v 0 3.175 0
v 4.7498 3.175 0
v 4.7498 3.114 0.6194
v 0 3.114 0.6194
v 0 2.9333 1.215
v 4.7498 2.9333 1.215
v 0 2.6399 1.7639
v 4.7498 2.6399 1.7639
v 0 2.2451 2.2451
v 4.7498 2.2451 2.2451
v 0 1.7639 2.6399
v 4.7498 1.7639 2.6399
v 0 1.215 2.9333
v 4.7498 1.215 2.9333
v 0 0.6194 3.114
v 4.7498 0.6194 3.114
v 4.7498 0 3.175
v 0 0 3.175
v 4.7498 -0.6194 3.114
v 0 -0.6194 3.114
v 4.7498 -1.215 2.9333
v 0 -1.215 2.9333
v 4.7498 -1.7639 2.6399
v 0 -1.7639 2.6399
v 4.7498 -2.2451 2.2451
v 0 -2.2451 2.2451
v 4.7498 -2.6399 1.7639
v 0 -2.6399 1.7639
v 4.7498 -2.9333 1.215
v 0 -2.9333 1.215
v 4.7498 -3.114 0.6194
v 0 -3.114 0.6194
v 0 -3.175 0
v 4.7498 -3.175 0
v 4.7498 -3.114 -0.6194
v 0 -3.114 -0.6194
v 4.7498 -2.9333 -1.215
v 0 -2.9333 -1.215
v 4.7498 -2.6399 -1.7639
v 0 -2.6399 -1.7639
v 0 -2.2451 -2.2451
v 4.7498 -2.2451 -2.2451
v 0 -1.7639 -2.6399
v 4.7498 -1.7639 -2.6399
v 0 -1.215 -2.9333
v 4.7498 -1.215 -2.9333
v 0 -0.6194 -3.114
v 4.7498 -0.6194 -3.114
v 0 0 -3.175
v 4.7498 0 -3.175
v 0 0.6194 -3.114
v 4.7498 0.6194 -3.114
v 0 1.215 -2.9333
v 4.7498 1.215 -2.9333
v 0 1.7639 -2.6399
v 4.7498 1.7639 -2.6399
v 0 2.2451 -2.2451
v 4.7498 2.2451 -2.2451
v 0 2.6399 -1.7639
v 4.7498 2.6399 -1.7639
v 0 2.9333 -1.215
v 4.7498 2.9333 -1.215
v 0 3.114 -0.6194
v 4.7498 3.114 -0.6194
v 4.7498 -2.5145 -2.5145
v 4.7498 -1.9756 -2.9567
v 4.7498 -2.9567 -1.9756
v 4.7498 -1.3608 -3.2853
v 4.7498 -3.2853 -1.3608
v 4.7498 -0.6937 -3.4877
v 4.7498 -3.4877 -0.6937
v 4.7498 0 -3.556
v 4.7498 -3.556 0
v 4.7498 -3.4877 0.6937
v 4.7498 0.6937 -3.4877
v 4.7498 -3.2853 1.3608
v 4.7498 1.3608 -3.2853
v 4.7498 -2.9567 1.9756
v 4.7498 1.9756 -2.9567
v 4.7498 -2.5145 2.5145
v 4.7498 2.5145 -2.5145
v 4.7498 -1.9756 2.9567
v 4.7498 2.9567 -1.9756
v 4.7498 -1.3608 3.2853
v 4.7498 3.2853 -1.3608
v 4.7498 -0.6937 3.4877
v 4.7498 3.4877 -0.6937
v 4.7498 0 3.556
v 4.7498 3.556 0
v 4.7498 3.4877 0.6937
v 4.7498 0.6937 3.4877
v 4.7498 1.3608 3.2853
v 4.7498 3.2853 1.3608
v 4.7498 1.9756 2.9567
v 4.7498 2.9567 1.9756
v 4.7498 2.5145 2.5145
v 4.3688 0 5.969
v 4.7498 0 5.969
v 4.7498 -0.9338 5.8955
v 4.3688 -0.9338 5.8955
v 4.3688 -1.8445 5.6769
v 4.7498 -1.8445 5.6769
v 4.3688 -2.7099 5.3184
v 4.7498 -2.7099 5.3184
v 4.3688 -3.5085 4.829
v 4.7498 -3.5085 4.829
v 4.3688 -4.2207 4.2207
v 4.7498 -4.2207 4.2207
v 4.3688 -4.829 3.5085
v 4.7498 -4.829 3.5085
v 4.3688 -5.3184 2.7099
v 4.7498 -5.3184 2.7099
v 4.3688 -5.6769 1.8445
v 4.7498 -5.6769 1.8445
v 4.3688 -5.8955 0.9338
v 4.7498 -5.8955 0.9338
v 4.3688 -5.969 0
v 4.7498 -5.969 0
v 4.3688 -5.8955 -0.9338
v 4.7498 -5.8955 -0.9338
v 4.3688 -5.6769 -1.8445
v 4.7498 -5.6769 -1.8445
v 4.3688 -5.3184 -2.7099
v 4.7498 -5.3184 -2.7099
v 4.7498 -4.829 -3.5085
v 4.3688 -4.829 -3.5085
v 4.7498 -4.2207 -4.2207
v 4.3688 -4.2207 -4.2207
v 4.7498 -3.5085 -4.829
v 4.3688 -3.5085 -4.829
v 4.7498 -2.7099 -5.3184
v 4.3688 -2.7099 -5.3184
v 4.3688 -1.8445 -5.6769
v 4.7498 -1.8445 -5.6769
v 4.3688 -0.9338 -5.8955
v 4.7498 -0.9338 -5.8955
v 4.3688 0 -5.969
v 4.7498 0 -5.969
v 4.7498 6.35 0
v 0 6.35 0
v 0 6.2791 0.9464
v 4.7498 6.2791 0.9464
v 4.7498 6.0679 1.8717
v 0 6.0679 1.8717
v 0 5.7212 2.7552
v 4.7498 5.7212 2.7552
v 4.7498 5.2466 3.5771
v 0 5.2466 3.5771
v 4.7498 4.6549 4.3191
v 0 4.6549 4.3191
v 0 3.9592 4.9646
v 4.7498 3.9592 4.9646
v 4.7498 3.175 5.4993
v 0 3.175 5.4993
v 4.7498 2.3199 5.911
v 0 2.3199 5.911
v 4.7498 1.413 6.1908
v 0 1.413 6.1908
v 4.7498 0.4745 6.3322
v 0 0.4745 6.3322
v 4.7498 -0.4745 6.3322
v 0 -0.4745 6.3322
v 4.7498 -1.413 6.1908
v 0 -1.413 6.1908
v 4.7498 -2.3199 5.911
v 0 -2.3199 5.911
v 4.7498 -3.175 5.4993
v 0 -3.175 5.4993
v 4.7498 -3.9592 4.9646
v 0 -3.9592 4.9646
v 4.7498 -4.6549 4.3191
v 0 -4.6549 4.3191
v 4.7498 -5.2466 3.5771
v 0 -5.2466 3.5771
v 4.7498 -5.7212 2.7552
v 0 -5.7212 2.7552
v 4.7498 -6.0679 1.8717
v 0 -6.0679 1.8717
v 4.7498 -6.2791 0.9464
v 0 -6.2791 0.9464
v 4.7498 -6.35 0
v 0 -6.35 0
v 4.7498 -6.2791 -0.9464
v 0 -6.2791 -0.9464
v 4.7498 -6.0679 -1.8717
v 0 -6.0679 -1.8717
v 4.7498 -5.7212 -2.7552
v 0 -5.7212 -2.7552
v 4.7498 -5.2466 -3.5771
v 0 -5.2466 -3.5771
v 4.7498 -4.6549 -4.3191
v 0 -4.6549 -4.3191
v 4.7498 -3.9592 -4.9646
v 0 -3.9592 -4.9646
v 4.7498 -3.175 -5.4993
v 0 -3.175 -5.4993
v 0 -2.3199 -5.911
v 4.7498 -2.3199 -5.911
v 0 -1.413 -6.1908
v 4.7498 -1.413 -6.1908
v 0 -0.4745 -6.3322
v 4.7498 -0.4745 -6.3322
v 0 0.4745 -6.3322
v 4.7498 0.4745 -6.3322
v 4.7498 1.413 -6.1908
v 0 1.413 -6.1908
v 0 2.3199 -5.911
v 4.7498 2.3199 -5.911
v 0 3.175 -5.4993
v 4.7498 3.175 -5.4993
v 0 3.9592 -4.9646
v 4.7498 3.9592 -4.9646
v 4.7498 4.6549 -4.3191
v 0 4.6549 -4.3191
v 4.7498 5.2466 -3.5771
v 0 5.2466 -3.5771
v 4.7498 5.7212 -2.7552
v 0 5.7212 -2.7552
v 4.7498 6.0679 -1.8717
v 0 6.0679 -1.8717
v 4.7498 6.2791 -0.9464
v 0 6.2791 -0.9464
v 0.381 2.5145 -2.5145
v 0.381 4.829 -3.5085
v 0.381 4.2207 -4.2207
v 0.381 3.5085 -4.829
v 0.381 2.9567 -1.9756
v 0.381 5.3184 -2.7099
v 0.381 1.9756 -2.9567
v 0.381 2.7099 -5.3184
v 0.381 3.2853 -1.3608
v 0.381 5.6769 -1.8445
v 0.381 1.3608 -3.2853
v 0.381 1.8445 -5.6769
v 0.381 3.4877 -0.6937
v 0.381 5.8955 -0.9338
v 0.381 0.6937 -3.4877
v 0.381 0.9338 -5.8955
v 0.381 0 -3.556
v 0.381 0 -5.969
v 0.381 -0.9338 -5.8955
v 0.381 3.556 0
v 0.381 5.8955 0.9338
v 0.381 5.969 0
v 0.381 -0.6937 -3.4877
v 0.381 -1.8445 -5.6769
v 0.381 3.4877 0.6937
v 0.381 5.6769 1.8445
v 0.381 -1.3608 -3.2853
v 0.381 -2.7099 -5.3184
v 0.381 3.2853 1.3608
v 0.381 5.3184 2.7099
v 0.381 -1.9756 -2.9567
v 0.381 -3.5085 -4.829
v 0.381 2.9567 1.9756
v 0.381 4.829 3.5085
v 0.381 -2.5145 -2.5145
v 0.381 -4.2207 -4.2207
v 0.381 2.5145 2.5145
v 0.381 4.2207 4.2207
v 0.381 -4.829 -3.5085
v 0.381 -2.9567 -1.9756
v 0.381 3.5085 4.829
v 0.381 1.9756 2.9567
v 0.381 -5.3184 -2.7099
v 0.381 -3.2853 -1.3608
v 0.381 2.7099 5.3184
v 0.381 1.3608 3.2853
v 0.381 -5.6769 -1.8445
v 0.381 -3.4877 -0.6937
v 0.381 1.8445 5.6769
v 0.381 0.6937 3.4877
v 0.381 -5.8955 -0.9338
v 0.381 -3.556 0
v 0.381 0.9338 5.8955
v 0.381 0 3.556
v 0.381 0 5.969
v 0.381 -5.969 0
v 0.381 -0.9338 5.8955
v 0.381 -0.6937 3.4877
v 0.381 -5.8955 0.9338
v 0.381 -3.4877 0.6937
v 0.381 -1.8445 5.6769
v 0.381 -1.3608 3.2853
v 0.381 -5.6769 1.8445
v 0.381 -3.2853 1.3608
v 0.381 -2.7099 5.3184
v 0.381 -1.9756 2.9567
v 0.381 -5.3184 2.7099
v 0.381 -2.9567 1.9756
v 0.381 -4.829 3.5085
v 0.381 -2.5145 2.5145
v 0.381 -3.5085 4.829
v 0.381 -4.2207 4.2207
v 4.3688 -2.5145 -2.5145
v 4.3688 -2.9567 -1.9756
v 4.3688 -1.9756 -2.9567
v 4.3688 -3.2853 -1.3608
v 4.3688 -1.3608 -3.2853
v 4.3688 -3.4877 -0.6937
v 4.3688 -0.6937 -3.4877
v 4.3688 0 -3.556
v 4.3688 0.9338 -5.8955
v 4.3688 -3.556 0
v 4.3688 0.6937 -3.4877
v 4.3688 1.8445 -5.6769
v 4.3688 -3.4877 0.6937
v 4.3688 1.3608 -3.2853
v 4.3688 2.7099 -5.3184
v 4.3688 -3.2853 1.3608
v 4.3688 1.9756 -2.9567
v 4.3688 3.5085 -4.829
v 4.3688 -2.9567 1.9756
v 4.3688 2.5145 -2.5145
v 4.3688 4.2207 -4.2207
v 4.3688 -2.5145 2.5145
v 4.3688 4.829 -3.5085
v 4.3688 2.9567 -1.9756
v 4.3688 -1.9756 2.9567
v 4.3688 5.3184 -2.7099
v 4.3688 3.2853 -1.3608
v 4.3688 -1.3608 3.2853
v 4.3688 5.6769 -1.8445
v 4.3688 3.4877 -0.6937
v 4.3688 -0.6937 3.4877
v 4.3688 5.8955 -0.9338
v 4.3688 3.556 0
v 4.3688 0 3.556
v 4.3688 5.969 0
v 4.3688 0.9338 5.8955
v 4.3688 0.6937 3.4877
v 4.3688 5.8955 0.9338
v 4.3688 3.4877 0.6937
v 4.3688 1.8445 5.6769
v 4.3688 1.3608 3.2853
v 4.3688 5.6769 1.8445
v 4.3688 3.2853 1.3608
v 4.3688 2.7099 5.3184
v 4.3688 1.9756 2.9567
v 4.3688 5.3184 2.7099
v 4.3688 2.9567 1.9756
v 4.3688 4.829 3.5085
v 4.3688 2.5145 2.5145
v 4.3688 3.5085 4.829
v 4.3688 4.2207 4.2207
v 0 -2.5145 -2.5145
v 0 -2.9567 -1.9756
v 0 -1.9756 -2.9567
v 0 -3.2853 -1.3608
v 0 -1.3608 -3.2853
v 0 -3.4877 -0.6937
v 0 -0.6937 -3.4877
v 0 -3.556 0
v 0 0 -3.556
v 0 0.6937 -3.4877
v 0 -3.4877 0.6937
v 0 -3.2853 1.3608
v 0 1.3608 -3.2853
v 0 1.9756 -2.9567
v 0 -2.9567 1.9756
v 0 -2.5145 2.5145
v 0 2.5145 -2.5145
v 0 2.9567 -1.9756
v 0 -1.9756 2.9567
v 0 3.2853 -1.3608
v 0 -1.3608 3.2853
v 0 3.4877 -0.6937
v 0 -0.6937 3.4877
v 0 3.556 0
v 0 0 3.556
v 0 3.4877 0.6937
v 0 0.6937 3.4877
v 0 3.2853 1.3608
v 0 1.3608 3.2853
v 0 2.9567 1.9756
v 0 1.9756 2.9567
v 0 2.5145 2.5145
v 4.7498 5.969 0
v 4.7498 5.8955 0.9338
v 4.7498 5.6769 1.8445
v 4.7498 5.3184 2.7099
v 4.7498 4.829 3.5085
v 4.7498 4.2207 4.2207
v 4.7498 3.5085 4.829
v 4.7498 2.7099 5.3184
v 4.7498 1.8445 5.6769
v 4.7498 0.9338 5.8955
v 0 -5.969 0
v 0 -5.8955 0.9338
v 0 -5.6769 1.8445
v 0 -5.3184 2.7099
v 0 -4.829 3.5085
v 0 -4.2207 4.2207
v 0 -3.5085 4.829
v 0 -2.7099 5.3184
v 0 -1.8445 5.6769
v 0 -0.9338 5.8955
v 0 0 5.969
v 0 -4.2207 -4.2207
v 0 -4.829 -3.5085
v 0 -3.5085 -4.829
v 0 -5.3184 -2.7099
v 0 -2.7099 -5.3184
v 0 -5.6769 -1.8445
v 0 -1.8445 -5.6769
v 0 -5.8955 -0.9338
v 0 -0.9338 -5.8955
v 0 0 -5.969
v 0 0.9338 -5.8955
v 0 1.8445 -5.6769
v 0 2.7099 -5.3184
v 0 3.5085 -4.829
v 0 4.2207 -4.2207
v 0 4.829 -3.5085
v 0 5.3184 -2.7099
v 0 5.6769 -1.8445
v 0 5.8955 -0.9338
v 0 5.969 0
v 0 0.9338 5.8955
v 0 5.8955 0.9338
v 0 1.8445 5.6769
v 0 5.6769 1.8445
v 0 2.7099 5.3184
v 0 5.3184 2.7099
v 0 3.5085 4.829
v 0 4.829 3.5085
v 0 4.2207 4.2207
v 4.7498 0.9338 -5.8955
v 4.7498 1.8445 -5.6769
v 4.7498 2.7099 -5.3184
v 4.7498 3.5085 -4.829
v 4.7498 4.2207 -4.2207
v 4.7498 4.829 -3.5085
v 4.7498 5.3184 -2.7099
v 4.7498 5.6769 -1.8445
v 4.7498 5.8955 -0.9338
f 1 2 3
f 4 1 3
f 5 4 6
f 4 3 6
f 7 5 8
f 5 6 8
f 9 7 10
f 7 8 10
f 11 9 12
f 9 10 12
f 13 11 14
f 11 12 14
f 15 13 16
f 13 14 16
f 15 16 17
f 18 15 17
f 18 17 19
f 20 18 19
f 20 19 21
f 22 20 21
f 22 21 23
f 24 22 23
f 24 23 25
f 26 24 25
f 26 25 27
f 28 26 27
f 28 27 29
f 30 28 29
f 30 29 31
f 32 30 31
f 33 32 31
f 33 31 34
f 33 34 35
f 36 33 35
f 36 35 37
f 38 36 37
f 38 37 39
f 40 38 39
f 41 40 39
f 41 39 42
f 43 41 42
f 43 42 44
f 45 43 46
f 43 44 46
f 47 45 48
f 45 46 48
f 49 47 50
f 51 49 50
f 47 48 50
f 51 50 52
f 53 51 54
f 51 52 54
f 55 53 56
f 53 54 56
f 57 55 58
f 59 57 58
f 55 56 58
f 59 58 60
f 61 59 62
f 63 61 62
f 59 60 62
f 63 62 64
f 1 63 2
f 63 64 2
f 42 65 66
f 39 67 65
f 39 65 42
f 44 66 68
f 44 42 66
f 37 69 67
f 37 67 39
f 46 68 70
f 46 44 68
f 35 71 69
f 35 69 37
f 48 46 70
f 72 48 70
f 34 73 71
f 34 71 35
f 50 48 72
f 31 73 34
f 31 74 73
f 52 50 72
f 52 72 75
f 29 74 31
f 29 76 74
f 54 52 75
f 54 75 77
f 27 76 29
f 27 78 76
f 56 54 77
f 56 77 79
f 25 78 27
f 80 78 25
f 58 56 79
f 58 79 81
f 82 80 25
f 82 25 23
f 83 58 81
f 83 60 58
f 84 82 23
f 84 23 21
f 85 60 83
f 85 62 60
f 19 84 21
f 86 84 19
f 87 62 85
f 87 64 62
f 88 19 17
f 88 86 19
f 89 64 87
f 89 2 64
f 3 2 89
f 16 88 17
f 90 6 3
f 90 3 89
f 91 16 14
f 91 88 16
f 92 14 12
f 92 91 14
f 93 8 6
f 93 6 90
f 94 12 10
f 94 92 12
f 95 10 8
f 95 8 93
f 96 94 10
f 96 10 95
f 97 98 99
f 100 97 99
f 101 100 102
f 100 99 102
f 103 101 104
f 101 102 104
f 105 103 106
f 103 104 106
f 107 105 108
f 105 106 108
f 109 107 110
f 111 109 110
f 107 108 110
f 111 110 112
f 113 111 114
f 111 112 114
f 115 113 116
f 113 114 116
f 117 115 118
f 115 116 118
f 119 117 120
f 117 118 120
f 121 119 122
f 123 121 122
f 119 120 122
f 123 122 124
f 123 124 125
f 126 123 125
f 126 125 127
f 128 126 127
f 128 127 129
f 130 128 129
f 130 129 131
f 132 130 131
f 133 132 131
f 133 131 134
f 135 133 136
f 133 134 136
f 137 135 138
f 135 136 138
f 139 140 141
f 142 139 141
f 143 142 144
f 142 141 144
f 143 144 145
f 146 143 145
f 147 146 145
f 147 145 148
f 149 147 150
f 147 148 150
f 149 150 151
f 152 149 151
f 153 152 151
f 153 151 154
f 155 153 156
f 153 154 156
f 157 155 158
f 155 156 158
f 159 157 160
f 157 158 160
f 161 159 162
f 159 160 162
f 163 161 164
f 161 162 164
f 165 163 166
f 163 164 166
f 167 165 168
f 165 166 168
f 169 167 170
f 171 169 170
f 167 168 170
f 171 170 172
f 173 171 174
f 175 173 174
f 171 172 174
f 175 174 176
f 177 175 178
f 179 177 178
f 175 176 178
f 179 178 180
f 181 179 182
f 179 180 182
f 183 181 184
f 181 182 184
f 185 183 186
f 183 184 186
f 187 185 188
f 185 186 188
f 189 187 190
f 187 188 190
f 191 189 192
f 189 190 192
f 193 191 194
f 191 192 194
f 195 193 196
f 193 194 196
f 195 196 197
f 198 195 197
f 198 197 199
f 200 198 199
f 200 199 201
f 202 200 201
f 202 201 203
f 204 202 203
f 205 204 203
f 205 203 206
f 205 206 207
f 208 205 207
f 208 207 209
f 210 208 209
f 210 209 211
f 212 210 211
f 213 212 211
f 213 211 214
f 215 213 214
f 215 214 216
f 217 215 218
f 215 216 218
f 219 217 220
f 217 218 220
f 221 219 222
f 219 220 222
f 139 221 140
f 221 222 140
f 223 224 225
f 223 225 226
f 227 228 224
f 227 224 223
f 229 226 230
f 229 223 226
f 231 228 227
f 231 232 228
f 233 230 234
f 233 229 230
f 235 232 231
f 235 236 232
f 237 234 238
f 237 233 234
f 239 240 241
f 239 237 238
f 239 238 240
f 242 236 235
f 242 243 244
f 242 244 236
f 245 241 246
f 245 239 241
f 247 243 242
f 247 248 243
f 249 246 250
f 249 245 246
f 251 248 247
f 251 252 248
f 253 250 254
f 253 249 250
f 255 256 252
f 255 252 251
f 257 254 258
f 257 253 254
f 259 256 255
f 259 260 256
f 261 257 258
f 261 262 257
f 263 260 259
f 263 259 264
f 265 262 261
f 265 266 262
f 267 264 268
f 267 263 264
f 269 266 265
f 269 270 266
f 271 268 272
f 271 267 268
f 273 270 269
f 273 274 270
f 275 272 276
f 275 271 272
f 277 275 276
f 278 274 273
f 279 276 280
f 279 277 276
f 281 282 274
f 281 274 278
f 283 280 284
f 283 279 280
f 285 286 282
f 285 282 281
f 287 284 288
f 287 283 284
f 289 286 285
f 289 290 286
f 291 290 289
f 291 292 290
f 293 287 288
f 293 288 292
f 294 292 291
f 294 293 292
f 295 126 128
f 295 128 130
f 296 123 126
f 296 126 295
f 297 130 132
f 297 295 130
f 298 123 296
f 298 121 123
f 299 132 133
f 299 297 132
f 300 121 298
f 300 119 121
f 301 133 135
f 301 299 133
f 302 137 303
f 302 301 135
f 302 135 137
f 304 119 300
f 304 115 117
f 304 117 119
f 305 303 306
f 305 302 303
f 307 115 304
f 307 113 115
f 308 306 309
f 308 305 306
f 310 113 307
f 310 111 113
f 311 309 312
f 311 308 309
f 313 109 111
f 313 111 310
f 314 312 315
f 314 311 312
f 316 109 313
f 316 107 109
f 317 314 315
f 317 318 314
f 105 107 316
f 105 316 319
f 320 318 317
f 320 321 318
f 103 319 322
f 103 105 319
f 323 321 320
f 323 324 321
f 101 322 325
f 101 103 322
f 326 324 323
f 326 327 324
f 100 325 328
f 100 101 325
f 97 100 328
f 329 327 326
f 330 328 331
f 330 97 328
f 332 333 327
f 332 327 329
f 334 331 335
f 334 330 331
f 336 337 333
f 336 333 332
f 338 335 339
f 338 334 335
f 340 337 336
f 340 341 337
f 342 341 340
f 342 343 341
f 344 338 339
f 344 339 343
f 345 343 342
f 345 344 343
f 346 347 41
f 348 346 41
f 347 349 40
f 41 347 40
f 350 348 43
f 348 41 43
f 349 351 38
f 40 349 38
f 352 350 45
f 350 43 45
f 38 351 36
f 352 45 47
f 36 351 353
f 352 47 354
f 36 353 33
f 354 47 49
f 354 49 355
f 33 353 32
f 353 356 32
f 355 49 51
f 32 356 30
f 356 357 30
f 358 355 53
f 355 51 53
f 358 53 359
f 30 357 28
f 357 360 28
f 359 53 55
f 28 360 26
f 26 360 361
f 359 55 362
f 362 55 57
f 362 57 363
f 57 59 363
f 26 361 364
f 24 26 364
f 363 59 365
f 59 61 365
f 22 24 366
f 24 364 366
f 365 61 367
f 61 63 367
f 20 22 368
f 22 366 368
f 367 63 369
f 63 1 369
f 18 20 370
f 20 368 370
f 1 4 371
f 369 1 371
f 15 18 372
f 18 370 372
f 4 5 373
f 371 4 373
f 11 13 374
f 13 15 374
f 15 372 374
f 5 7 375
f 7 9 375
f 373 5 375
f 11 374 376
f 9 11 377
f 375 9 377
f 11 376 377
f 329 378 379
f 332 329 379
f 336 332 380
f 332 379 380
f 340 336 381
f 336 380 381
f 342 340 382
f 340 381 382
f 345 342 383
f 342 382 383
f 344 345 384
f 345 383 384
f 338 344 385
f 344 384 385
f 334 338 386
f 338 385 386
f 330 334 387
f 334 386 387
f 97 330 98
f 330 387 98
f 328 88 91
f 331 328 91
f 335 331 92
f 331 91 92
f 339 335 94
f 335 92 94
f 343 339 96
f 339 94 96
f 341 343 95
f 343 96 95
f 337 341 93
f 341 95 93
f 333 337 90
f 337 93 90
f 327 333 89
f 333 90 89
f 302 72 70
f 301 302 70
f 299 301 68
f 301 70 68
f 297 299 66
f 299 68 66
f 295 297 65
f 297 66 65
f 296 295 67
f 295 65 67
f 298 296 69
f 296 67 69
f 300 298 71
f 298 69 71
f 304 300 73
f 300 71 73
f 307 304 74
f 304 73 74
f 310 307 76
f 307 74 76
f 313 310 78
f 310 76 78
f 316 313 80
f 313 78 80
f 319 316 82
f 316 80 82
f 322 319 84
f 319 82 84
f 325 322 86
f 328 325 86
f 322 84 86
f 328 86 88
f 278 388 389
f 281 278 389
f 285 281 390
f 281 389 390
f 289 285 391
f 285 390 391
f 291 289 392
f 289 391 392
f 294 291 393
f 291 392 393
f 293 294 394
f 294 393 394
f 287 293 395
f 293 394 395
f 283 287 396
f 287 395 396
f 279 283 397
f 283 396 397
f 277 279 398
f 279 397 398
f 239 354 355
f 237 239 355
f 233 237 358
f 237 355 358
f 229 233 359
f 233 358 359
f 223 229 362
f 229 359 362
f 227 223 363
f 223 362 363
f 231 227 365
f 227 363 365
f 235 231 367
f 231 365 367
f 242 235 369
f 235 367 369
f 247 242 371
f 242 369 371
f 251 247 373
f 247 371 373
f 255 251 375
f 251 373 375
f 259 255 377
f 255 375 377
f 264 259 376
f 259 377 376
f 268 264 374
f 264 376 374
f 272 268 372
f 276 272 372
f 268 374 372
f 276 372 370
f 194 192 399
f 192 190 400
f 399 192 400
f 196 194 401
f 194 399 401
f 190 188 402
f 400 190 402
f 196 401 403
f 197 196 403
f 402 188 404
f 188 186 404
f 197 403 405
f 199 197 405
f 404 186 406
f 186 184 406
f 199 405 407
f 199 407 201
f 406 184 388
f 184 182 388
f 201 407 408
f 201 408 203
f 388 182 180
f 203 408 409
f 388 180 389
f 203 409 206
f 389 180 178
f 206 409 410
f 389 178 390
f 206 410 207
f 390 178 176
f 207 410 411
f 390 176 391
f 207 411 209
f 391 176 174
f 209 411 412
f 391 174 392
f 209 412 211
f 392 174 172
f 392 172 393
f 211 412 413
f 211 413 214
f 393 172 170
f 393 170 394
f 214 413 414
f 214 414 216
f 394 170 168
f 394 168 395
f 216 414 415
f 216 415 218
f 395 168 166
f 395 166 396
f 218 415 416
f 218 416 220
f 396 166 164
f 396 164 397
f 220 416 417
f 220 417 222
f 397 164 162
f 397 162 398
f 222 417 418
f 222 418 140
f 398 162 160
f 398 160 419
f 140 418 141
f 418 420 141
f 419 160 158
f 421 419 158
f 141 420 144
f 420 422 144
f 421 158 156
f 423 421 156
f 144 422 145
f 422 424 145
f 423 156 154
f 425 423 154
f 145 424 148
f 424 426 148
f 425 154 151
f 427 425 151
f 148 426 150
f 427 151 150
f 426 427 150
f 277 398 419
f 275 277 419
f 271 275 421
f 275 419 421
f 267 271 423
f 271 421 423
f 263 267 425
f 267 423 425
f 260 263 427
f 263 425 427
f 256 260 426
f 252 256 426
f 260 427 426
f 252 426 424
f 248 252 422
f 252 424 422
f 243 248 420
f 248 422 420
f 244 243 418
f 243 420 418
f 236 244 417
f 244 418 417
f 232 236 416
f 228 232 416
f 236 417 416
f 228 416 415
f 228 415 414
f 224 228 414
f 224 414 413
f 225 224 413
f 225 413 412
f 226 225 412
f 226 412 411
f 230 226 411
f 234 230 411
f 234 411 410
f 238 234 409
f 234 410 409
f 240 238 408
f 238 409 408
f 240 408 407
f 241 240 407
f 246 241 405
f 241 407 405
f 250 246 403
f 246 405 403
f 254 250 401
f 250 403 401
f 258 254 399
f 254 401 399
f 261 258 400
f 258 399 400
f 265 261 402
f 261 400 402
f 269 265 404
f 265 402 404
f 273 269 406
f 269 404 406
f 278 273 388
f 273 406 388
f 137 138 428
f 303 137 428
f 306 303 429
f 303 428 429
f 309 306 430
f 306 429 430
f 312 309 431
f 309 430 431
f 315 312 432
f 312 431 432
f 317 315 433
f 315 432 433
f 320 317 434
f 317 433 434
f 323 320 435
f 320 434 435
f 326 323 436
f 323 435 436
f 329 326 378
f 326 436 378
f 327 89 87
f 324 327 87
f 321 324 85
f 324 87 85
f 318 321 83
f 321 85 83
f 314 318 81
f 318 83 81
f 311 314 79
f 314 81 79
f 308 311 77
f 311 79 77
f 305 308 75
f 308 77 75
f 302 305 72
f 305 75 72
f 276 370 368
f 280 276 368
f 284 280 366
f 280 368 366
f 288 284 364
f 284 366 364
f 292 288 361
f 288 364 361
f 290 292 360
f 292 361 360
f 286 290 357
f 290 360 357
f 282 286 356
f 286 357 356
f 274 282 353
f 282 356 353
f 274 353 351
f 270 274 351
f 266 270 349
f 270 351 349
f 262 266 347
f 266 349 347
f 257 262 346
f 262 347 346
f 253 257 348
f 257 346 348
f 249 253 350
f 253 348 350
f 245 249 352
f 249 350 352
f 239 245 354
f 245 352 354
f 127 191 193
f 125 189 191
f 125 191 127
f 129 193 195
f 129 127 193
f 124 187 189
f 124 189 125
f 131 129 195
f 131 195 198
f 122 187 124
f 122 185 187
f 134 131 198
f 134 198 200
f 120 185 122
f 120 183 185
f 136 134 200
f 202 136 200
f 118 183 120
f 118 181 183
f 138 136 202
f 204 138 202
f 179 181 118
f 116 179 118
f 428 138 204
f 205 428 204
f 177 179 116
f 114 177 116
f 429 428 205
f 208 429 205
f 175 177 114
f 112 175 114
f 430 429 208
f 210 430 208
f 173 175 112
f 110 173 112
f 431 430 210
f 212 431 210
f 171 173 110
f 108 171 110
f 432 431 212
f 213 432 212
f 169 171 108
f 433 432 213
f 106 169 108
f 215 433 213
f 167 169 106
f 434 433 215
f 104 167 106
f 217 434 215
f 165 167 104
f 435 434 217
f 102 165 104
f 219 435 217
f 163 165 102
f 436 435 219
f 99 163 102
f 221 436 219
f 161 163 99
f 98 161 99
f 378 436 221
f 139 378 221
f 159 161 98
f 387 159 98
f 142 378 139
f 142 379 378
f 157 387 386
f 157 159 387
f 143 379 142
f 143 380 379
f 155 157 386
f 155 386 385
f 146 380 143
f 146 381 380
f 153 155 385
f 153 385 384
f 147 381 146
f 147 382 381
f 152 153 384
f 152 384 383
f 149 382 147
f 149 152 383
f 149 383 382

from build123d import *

# Parameters (mm, degrees)
F0_R     = 6.35
F1_DEPTH = 4.7498
F2_R     = 3.175
F3_DEPTH = 25.4
F5_DEPTH = 0.381
F7_DEPTH = 0.381


with BuildPart() as f1:
    # F0 (on Right) → F1 (new body)
    with BuildSketch(Plane.YZ):
        Circle(F0_R)
    extrude(amount=F1_DEPTH)

    # F2 (on face) → F3 (cut)
    with BuildSketch(Plane.YZ.offset(4.7498)):
        Circle(F2_R)
    extrude(amount=-F3_DEPTH, mode=Mode.SUBTRACT)

    # F4 (on face) → F5 (cut)
    with BuildSketch(Plane(origin=(0, 0, 0), x_dir=(0, -1, 0), z_dir=(-1, 0, 0))):
        with BuildLine():
            ThreePointArc((0, -5.969), (4.22072, -4.22072), (5.969, 0))
            ThreePointArc((5.969, 0), (4.22072, 4.22072), (0, 5.969))
            ThreePointArc((0, 5.969), (-5.969, 0), (0, -5.969))
        make_face()
        with BuildLine():
            ThreePointArc((0, 3.556), (2.514472, 2.514472), (3.556, 0))
            ThreePointArc((3.556, 0), (2.514472, -2.514472), (0, -3.556))
            ThreePointArc((0, -3.556), (-3.556, 0), (0, 3.556))
        make_face(mode=Mode.SUBTRACT)
    extrude(amount=-F5_DEPTH, mode=Mode.SUBTRACT)

    # F6 (on face) → F7 (cut)
    with BuildSketch(Plane.YZ.offset(4.7498)):
        with BuildLine():
            ThreePointArc((0, -5.969), (4.22072, -4.22072), (5.969, 0))
            ThreePointArc((5.969, 0), (4.22072, 4.22072), (0, 5.969))
            ThreePointArc((0, 5.969), (-5.969, 0), (0, -5.969))
        make_face()
        with BuildLine():
            ThreePointArc((0, 3.556), (2.514472, 2.514472), (3.556, 0))
            ThreePointArc((3.556, 0), (2.514472, -2.514472), (0, -3.556))
            ThreePointArc((0, -3.556), (-3.556, 0), (0, 3.556))
        make_face(mode=Mode.SUBTRACT)
    extrude(amount=-F7_DEPTH, mode=Mode.SUBTRACT)


solid = f1.part
